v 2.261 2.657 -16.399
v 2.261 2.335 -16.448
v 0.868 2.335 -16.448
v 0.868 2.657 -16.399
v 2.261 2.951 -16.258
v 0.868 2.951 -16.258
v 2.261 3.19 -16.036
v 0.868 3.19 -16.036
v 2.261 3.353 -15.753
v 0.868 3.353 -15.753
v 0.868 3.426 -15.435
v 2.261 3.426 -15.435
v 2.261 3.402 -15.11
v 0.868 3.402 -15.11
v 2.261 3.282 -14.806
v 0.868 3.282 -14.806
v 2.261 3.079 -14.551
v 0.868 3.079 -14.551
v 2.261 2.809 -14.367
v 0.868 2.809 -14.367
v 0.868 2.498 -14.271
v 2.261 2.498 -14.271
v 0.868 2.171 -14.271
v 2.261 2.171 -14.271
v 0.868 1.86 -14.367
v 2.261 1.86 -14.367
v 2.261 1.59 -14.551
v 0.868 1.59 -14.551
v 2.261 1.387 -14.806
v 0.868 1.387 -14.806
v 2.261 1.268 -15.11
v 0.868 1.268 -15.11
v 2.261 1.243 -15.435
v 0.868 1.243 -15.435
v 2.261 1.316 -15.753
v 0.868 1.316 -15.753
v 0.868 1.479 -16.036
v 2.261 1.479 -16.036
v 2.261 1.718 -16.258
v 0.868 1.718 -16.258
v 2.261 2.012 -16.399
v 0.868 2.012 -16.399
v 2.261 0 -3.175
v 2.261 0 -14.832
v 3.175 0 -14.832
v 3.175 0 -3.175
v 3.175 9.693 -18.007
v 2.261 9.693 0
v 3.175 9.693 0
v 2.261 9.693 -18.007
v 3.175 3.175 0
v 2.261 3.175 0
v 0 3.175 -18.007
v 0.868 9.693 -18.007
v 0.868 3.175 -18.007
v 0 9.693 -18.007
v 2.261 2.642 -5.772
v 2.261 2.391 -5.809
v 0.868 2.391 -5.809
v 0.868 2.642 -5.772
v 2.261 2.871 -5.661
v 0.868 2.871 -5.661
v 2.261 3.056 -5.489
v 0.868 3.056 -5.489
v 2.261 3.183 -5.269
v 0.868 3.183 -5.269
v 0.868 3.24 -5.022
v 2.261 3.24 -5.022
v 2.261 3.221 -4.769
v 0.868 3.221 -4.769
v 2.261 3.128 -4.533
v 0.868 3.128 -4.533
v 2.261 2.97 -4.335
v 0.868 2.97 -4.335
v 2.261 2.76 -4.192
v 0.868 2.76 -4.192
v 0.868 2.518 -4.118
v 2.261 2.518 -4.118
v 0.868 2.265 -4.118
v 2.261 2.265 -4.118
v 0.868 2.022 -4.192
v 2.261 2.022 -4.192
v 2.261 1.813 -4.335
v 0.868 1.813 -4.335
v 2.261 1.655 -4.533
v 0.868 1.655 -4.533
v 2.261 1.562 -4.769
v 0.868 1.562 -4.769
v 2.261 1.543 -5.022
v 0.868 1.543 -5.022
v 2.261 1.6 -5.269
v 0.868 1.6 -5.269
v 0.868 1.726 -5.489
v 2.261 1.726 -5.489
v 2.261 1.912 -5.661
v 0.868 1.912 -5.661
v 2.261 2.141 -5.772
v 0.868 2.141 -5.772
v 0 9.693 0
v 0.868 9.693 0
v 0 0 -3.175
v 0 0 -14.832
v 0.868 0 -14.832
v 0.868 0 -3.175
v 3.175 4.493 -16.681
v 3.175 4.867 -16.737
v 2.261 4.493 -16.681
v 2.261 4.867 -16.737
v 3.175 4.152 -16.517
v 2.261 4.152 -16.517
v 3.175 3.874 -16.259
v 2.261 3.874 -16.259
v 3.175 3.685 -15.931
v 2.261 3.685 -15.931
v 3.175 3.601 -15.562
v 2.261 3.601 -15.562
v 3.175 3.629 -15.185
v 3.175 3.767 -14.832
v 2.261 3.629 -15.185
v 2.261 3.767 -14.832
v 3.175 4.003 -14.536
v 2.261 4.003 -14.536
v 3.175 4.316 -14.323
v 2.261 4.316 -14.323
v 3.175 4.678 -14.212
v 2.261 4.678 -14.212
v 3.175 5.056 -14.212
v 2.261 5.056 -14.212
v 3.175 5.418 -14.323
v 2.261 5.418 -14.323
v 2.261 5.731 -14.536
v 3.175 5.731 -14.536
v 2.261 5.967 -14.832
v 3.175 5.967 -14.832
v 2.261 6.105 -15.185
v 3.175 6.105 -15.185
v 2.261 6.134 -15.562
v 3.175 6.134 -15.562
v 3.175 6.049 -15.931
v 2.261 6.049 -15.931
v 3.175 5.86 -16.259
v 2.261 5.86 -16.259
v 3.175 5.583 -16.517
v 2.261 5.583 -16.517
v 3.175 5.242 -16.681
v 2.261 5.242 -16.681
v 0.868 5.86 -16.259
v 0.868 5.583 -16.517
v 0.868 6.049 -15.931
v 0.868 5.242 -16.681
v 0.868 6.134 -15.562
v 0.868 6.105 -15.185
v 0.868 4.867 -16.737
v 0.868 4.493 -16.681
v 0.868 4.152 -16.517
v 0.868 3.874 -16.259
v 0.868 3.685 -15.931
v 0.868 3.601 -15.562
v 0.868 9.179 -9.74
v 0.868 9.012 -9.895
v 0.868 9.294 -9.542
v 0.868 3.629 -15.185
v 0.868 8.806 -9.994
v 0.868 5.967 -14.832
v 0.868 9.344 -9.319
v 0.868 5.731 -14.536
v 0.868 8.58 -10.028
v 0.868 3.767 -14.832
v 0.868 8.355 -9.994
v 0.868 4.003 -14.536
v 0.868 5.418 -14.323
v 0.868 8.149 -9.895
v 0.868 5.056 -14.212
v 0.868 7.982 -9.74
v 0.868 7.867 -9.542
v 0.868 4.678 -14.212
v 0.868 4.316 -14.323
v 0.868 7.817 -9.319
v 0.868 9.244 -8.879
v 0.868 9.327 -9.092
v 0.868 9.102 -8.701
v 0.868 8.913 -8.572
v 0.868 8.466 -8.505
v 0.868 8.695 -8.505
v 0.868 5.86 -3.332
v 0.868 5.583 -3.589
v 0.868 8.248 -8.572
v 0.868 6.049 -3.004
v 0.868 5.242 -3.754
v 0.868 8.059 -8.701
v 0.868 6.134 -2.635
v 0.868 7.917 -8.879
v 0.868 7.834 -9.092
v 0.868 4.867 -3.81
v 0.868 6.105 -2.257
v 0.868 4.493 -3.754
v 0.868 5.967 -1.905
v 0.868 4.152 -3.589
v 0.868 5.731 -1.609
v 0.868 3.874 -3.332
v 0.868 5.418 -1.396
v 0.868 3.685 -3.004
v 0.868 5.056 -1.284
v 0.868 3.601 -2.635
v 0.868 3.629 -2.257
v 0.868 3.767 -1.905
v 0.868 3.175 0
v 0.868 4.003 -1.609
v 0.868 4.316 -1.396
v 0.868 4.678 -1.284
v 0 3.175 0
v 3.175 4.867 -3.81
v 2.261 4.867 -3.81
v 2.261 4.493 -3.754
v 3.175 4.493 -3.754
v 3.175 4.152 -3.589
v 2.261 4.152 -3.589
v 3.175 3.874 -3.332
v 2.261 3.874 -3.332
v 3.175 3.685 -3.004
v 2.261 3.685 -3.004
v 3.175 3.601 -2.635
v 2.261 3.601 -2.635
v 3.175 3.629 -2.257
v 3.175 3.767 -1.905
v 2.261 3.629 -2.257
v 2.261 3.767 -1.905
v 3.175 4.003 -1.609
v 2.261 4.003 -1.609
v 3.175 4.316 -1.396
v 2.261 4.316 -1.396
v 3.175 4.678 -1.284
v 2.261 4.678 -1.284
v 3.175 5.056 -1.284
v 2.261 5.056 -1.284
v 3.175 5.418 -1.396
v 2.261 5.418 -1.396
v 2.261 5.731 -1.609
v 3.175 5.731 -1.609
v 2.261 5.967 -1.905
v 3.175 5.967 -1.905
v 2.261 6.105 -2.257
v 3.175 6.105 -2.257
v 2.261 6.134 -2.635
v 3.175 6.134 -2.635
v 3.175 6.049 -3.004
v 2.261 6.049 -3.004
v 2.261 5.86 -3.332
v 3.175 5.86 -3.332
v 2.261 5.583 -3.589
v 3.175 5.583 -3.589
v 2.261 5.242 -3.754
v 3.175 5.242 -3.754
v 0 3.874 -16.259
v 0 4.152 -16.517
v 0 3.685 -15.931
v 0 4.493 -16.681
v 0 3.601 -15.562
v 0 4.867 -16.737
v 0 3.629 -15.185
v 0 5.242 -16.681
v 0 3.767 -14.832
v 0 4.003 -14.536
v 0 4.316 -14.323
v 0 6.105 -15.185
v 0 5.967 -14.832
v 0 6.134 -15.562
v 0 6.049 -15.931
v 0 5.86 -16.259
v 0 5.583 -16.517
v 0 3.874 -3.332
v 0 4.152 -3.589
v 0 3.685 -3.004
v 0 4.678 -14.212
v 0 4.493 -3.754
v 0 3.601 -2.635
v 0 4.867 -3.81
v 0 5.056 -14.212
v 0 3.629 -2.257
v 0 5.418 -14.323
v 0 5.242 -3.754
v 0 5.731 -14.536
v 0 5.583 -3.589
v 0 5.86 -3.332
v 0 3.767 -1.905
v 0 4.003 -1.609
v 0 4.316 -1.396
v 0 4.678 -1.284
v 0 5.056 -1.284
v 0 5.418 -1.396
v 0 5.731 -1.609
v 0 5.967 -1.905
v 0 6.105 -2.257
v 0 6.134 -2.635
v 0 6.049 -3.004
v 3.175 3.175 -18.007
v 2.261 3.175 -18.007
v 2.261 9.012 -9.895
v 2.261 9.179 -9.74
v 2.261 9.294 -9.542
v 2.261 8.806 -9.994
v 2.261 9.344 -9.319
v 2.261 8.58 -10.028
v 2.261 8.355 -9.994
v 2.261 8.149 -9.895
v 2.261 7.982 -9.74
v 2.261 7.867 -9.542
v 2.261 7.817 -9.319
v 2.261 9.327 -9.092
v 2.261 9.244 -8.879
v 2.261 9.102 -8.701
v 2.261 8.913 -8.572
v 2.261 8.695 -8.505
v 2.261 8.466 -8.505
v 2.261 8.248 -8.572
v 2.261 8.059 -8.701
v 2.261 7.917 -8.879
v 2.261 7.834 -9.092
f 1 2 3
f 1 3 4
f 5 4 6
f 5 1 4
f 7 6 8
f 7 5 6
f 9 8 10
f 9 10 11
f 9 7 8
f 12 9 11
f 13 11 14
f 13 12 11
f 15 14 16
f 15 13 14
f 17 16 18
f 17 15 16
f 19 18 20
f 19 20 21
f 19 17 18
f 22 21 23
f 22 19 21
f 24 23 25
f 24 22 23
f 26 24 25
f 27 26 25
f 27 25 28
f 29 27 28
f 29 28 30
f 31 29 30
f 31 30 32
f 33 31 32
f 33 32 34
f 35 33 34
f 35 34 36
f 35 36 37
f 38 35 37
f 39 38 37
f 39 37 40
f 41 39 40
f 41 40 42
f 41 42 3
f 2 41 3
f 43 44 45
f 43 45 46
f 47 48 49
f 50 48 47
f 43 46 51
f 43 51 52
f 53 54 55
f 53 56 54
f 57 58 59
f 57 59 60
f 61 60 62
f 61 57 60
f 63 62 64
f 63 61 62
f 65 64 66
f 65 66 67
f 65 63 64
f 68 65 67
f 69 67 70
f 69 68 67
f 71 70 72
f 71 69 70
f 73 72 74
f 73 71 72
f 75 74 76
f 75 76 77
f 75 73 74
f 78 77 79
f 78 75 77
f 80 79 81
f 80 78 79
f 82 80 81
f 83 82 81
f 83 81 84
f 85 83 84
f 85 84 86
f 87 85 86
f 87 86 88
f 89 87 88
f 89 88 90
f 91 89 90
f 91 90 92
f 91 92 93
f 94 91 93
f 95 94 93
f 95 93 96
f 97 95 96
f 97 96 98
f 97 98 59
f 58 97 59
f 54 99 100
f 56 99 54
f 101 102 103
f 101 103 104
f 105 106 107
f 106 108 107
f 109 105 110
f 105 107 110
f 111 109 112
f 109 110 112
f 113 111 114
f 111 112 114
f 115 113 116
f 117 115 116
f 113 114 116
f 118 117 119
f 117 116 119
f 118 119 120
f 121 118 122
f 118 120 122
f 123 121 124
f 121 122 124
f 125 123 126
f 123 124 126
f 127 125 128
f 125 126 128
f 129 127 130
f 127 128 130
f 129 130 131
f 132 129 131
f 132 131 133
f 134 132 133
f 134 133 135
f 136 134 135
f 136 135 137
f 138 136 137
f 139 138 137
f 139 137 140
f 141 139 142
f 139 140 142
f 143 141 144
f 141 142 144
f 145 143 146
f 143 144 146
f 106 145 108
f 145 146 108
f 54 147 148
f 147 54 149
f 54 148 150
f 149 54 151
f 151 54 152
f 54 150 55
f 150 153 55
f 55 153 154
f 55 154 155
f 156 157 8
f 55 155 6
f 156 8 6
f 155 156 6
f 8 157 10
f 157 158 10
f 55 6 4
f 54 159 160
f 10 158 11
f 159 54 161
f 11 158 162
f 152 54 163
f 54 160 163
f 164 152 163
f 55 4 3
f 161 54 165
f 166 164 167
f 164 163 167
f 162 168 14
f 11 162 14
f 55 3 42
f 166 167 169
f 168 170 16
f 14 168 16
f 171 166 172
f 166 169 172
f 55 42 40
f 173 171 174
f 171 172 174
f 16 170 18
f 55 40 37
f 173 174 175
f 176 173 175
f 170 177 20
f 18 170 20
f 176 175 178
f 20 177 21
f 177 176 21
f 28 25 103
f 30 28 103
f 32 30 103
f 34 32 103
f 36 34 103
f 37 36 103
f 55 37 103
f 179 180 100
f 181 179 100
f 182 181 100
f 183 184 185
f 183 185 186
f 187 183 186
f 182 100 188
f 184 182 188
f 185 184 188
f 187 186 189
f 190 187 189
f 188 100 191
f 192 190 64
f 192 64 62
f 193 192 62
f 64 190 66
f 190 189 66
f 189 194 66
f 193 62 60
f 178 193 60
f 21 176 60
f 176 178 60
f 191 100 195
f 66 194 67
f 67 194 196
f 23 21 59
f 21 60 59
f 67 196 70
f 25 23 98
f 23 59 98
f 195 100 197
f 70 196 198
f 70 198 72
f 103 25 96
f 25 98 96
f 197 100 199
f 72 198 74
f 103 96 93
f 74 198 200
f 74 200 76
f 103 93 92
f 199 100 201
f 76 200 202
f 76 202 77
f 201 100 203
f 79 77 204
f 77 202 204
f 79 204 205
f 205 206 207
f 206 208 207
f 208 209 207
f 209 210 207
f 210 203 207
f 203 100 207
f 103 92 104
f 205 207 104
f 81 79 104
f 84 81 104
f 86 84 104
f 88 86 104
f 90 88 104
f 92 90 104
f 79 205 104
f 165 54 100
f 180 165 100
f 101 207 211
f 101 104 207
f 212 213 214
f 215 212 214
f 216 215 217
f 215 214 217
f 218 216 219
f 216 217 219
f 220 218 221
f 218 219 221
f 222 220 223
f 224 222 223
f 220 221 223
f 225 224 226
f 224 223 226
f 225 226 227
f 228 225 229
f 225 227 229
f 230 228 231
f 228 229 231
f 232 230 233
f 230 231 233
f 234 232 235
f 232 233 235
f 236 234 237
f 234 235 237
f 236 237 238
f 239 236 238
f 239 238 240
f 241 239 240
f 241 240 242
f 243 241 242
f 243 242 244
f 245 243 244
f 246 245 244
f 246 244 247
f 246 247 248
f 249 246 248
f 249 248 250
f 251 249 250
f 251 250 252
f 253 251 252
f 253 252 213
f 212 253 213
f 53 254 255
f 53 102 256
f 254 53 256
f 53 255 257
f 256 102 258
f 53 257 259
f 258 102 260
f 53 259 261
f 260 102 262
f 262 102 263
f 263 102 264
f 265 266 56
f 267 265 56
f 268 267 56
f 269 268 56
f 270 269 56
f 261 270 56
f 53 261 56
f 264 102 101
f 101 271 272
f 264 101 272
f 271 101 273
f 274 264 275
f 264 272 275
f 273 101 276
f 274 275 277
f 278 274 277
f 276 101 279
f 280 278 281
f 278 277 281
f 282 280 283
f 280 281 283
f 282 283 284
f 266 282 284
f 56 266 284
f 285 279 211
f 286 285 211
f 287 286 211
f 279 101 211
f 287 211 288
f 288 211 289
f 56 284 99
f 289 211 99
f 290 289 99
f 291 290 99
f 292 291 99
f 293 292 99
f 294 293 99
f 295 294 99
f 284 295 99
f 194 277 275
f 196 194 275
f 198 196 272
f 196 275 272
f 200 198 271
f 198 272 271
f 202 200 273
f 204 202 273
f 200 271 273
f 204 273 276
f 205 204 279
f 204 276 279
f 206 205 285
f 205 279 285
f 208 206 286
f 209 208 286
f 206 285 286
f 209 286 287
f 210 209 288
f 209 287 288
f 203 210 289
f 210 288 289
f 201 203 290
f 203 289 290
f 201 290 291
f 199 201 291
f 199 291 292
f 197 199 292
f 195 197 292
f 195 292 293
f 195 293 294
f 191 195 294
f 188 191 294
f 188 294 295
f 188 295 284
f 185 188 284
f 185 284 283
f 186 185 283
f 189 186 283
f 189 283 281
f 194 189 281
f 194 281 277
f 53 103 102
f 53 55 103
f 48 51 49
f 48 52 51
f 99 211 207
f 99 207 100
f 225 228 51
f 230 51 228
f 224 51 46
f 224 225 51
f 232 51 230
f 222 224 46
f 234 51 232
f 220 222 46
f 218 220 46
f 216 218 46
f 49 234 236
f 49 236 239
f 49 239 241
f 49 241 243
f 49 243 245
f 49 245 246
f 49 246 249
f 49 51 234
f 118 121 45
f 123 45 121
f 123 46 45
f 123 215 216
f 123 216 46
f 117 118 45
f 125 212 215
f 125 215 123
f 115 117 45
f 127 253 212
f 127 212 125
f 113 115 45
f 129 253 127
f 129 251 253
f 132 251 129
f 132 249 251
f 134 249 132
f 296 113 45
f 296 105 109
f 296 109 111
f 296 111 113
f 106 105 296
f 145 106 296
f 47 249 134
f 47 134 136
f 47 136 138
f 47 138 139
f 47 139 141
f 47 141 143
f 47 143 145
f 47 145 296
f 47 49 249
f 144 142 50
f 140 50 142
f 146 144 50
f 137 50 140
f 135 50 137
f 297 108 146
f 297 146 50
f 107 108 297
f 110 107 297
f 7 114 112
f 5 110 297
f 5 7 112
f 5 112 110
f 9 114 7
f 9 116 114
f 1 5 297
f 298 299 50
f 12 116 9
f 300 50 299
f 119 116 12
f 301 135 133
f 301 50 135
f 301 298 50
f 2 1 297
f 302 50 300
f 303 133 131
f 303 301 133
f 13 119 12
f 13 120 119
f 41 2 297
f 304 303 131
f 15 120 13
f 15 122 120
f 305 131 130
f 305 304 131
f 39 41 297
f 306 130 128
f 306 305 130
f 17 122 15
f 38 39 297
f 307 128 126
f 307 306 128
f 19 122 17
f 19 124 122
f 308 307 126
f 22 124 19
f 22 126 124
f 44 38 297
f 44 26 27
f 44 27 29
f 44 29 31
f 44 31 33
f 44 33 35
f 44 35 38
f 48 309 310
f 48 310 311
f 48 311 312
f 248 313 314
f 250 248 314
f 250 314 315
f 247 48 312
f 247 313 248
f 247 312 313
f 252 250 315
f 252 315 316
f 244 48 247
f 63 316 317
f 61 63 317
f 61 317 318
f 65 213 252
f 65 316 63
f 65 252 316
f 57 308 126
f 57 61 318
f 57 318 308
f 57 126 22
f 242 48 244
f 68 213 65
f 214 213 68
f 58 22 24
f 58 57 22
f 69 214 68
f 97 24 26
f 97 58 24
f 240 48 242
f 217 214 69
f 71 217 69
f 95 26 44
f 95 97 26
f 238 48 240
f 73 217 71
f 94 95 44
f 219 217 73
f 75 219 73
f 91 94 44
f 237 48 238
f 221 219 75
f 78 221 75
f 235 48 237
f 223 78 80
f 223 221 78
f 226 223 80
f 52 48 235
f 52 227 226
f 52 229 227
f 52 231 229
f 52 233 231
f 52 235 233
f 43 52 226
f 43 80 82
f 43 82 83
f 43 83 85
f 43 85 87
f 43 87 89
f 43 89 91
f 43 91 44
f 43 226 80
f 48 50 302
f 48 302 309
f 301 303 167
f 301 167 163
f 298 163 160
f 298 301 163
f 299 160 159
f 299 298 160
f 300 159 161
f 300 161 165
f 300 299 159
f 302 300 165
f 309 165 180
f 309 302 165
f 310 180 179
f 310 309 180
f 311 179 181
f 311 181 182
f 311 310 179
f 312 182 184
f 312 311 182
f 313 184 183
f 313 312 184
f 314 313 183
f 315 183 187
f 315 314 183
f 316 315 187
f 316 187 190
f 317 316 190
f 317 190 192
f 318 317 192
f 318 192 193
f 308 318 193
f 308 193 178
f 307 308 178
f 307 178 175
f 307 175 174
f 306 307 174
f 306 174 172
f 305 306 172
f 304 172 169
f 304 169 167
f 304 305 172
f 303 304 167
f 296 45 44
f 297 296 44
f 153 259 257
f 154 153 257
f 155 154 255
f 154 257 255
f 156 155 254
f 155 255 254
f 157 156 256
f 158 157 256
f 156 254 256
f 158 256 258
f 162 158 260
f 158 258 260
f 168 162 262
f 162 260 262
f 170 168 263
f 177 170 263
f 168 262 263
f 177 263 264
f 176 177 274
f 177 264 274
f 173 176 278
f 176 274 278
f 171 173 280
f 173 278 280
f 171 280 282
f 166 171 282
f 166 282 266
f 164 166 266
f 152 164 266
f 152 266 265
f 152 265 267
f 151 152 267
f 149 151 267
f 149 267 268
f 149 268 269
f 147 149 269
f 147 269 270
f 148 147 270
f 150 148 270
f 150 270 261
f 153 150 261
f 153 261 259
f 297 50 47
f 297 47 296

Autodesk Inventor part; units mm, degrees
ref_plane "YZ Plane" through (0, 0, 0) normal (1, 0, 0) x (0, 1, 0)
ref_plane "XZ Plane" through (0, 0, 0) normal (0, 1, 0) x (-1, 0, 0)
ref_plane "XY Plane" through (0, 0, 0) normal (0, 0, 1) x (1, 0, 0)
sketch "Sketch1" plane through (0, 0, 0) normal (1, 0, 0) x (0, 1, 0)
  line L0 (0, 0) -> (9.6932, 0)
  line L1 (9.6932, 0) -> (9.6932, -18.0074)
  line L2 (9.6932, -18.0074) -> (0, -18.0074)
  line L3 (0, -18.0074) -> (0, 0)
extrude "Extrusion1" add sketch "Sketch1" along normal blind 3.175
chamfer "Chamfer1" distance 3.175 angle 45 1 edges at (1.5875, 0, 0)
chamfer "Chamfer2" distance 3.175 angle 45 1 edges at (1.5875, 0, -18.0074)
sketch "Sketch2" plane through (0, 9.6932, 0) normal (0, 0, 1) x (1, 0, 0)
  line L0 (0, 0) -> (3.175, 0) projected
  line L1 (1.5875, 0) -> (0.8676, 0)
  line L2 (0.8676, 0) -> (0.8676, -11.3231)
  line L3 (0.8676, -11.3231) -> (1.5875, -11.3231)
  line L4 (1.5875, -11.3231) -> (1.5875, 0)
  line L5 (1.5875, 0) -> (2.2609, 0)
  line L6 (2.2609, 0) -> (2.2609, -11.3231)
  line L7 (2.2609, -11.3231) -> (1.5875, -11.3231)
  line L8 (1.5875, -11.3231) -> (1.5875, 0)
  point P0 (0, -9.6932)
extrude "Extrusion2" cut sketch "Sketch2" against normal blind 254
ref_plane "Work Plane1" through (3.2004, 0, 0) normal (1, 0, 0) x (0, 0, -1)
sketch "Sketch3" plane through (3.2004, 0, 0) normal (1, 0, 0) x (0, 0, -1)
  circle A0 centre (9.2621, 8.5805) radius 0.766
  point P0 (0, 0)
extrude "Extrusion3" add sketch "Sketch3" against normal blind 3.175
sketch "Sketch4" plane through (3.175, 0, 0) normal (1, 0, 0) x (0, 0, -1)
  circle A0 centre (4.9587, 2.3914) radius 0.8506
  point P0 (0, 0)
extrude "Extrusion4" add sketch "Sketch4" against normal blind 3.175
thicken "Thicken1" operation add thickness 0.0254 both sides no extend neighbours yes toward (-1, 0, 0) faces at (3.2004, 8.8685, -9.0418)
sketch "Sketch5" plane through (3.175, 3.175, -18.0074) normal (1, 0, 0) x (0, 0, -1)
  circle A0 centre (-2.6542, -0.8404) radius 1.0945
  point P0 (-18.0074, -3.175)
extrude "Extrusion5" add sketch "Sketch5" against normal blind 3.175
hole "Hole4" at (3.175, 4.8672, -2.54) direction (-1, 0, 0) diameter 2.54 depth 25.4 tip angle 118
sketch "Sketch6" plane through (3.175, 3.175, -18.0074) normal (1, 0, 0) x (0, 0, -1)
  point P0 (-18.0074, -3.175)
hole "Hole5" at (3.175, 4.8672, -15.4674) direction (-1, 0, 0) diameter 2.54 depth 25.4 tip angle 118
properties part number "gabetrain"
